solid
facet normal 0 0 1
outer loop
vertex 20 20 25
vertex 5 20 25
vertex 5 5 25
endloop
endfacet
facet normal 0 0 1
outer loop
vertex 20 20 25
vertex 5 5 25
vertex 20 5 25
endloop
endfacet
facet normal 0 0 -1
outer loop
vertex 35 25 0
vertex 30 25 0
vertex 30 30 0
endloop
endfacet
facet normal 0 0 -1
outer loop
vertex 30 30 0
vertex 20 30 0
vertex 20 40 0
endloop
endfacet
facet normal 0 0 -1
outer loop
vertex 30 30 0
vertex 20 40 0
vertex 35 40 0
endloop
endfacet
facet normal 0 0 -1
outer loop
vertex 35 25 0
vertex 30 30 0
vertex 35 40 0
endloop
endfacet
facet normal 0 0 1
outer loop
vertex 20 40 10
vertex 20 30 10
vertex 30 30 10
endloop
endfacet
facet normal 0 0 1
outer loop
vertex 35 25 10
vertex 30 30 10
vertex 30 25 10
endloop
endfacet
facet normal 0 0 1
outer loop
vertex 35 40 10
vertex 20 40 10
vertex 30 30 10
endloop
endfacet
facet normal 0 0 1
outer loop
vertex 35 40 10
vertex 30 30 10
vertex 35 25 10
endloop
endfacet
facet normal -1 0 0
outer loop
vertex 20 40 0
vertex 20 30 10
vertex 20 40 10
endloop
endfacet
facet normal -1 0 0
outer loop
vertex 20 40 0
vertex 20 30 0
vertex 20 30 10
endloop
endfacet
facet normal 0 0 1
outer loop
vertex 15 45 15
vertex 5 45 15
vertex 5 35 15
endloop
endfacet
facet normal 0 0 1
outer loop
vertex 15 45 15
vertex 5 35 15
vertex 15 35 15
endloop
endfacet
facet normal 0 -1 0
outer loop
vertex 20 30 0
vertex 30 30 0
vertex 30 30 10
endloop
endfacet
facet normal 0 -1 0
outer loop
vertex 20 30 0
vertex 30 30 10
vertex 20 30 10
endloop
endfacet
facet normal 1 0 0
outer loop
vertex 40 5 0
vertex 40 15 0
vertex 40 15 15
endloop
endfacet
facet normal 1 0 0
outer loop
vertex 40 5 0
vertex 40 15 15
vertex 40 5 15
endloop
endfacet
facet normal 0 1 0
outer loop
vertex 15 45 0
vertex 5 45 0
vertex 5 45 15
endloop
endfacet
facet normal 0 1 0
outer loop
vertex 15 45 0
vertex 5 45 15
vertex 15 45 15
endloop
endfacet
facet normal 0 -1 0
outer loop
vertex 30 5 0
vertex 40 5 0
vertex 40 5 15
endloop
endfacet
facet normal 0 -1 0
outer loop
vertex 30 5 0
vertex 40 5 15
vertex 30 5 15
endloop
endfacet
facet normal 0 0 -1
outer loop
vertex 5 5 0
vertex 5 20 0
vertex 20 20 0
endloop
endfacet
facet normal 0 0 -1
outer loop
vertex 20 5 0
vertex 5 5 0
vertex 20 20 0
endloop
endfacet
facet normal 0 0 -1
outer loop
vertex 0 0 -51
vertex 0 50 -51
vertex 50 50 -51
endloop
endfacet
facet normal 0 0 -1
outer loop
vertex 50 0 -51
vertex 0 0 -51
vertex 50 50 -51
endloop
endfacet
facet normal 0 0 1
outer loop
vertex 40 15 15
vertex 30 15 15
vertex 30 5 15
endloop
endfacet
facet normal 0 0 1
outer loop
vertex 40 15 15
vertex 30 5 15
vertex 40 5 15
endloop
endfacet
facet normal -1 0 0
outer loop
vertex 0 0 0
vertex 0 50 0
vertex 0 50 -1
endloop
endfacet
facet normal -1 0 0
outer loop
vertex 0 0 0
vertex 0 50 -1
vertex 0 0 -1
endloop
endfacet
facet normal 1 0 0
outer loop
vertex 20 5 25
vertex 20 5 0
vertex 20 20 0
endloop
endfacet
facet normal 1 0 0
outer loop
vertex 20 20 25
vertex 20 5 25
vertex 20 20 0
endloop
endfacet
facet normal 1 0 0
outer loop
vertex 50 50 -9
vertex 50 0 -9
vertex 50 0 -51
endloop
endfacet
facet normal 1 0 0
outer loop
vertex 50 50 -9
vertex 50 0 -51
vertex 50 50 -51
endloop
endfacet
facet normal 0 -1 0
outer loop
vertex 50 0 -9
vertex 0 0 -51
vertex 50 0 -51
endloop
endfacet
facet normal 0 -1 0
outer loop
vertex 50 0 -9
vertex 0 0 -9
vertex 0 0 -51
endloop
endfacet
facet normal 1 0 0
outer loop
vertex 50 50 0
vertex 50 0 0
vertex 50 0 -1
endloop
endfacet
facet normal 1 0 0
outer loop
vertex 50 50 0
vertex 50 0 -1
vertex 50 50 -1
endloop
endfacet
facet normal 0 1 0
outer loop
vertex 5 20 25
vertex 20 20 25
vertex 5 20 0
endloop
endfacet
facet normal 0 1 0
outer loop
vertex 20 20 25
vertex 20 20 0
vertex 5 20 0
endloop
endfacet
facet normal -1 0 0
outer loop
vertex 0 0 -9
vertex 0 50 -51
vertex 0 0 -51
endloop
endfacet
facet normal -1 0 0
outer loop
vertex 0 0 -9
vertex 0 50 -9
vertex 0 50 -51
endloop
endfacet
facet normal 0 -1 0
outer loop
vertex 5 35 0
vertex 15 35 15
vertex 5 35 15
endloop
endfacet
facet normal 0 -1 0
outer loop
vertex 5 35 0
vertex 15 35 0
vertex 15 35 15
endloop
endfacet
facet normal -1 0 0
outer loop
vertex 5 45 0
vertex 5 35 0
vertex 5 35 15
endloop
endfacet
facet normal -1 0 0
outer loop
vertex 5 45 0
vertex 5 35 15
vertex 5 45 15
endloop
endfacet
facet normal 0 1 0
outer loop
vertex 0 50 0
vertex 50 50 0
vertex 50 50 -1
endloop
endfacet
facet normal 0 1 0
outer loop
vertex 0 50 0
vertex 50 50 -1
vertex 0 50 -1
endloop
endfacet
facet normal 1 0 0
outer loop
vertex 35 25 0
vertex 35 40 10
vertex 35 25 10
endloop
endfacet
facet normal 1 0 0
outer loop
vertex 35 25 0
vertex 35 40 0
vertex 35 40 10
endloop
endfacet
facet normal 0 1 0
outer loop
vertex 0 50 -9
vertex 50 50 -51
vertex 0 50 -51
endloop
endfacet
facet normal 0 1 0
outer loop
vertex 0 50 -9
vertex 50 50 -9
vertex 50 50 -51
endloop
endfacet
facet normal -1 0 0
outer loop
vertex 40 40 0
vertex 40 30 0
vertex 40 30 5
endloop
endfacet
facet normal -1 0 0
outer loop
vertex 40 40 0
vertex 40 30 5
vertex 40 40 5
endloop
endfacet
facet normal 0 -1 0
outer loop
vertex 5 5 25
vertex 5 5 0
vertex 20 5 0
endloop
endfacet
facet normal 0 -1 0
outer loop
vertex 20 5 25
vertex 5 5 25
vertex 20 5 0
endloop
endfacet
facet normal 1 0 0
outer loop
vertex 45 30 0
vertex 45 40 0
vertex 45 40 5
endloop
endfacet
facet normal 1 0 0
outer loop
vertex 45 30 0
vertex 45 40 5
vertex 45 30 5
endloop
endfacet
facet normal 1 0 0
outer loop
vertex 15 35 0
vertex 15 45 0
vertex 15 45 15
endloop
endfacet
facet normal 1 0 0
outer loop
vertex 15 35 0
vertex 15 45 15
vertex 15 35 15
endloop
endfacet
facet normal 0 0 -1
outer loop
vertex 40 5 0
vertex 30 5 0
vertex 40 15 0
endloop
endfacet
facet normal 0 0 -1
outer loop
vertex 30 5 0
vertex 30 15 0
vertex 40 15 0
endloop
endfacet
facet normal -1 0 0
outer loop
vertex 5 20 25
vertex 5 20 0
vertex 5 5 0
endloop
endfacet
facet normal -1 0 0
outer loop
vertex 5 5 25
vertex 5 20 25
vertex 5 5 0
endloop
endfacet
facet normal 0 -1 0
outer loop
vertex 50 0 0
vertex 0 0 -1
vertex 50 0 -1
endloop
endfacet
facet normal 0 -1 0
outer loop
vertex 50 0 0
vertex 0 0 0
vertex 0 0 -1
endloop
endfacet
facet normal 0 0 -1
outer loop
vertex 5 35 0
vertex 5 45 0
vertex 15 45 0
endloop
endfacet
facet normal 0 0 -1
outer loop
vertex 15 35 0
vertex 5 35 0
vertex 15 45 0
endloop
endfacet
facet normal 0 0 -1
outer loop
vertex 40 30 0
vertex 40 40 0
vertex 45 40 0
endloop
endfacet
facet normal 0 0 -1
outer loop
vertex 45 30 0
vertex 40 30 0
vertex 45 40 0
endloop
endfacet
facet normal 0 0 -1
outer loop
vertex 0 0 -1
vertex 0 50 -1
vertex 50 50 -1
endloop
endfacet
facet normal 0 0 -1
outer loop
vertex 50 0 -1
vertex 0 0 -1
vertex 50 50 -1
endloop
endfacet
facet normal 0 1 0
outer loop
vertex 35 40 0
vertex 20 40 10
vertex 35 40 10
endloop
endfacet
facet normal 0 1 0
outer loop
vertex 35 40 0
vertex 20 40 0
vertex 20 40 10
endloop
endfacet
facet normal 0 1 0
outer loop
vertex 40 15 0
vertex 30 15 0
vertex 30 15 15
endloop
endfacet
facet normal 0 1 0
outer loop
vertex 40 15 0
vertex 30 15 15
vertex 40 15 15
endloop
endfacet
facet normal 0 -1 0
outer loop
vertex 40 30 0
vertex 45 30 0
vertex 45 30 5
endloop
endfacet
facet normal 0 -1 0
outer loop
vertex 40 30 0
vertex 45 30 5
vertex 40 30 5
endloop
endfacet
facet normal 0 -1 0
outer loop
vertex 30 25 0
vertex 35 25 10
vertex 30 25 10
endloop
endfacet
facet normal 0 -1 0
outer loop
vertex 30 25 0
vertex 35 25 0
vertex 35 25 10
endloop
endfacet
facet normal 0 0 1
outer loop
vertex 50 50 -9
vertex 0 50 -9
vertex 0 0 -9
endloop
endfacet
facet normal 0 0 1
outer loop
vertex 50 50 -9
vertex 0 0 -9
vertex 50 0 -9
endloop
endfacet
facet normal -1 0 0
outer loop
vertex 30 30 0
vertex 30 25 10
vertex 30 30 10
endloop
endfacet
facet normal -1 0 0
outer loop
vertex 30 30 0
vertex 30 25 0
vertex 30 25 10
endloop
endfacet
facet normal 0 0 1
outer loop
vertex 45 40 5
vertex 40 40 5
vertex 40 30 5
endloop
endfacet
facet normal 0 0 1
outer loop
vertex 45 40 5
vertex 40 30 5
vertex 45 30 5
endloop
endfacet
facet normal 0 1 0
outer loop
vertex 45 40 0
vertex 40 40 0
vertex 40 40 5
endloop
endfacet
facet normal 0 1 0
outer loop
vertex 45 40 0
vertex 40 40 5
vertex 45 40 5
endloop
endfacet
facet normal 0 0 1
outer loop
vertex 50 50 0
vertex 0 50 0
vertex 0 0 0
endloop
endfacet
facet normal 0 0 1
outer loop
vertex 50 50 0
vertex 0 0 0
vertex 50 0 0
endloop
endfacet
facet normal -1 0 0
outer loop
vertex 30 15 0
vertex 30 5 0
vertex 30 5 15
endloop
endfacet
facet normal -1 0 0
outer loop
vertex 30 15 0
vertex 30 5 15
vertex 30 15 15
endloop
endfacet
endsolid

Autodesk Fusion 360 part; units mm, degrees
sketch "Skizze1" plane through (0, 0, 0) normal (0, 0, 1) x (1, 0, 0)
  line L0 (0, 0) -> (50, 0)
  line L1 (50, 0) -> (50, 50)
  line L2 (50, 50) -> (0, 50)
  line L3 (0, 50) -> (0, 0)
  line L4 (20, 20) -> (5, 20)
  line L5 (5, 20) -> (5, 5)
  line L6 (5, 5) -> (20, 5)
  line L7 (20, 5) -> (20, 20)
  line L8 (20, 40) -> (35, 40)
  line L9 (35, 40) -> (35, 25)
  line L10 (35, 25) -> (30, 25)
  line L11 (30, 25) -> (30, 30)
  line L12 (30, 30) -> (20, 30)
  line L13 (20, 30) -> (20, 40)
  line L14 (5, 45) -> (15, 45)
  line L15 (15, 45) -> (15, 35)
  line L16 (15, 35) -> (5, 35)
  line L17 (5, 35) -> (5, 45)
  line L18 (30, 15) -> (40, 15)
  line L19 (40, 15) -> (40, 5)
  line L20 (40, 5) -> (30, 5)
  line L21 (30, 5) -> (30, 15)
  line L22 (40, 40) -> (45, 40)
  line L23 (45, 40) -> (45, 30)
  line L24 (45, 30) -> (40, 30)
  line L25 (40, 30) -> (40, 40)
extrude "Extrusion1" add sketch "Skizze1" along normal blind 25 contours L4 L5 L6 L7 makes body 1 in component "Großer Block"
extrude "Extrusion1'" add sketch "Skizze1" along normal blind 15 separate body contours L18 L19 L20 L21 makes body 2 in component "Medium Block 1"
extrude "Extrusion1''" add sketch "Skizze1" along normal blind 15 separate body contours L14 L15 L16 L17 makes body 3 in component "Medium Block 2#"
extrude "Extrusion1'''" add sketch "Skizze1" along normal blind 10 separate body contours L8 L9 L10 L11 L12 L13 makes body 4 in component "L Block"
extrude "Extrusion1''''" add sketch "Skizze1" along normal blind 5 separate body contours L22 L23 L24 L25 makes body 5 in component "Smal Block 1"
extrude "Extrusion1'''''" add sketch "Skizze1" against normal blind 1 separate body contours L0 L1 L2 L3 | L4 L5 L6 L7 | L8 L9 L10 L11 L12 L13 | L14 L15 L16 L17 | L18 L19 L20 L21 | L22 L23 L24 L25 makes body 6 in component "Boden"
extrude "Extrusion1''''''" add 1 faces at (16.6667, 33.3333, -1) along direction (0, 0, -1) blind 50 separate body on bodies 6 makes body 7 in component "Ground below"
extrude "Extrusion2" cut 1 faces at (16.6667, 33.3333, -1) along direction (0, 0, -1) blind 1 on bodies 7 bodies 7 in component "Ground below"
extrude "Extrusion3" cut 1 faces at (16.6667, 33.3333, -51) along direction (0, 0, 1) blind 8 from surface at 42 on bodies 7 bodies 7 in component "Ground below"
component "Großer Block" placed x (1, 0, 0) y (0, 1, 0) z (0, 0, 1) at (0, 0, 0)
component "Medium Block 1" placed x (1, 0, 0) y (0, 1, 0) z (0, 0, 1) at (0, 0, 0)
component "Medium Block 2#" placed x (1, 0, 0) y (0, 1, 0) z (0, 0, 1) at (0, 0, 0)
component "L Block" placed x (1, 0, 0) y (0, 1, 0) z (0, 0, 1) at (0, 0, 0)
component "Smal Block 1" placed x (1, 0, 0) y (0, 1, 0) z (0, 0, 1) at (0, 0, 0)
component "Boden" placed x (1, 0, 0) y (0, 1, 0) z (0, 0, 1) at (0, 0, 0)
component "Ground below" placed x (1, 0, 0) y (0, 1, 0) z (0, 0, 1) at (0, 0, 0)
equation "d21 = -h_wasser"
equation "d22 = -( a_Block - h_wasser )"
equation "h_wasser = ( 0.84 * 50 ) * 1 mm"
equation "a_Block = 50 mm"
